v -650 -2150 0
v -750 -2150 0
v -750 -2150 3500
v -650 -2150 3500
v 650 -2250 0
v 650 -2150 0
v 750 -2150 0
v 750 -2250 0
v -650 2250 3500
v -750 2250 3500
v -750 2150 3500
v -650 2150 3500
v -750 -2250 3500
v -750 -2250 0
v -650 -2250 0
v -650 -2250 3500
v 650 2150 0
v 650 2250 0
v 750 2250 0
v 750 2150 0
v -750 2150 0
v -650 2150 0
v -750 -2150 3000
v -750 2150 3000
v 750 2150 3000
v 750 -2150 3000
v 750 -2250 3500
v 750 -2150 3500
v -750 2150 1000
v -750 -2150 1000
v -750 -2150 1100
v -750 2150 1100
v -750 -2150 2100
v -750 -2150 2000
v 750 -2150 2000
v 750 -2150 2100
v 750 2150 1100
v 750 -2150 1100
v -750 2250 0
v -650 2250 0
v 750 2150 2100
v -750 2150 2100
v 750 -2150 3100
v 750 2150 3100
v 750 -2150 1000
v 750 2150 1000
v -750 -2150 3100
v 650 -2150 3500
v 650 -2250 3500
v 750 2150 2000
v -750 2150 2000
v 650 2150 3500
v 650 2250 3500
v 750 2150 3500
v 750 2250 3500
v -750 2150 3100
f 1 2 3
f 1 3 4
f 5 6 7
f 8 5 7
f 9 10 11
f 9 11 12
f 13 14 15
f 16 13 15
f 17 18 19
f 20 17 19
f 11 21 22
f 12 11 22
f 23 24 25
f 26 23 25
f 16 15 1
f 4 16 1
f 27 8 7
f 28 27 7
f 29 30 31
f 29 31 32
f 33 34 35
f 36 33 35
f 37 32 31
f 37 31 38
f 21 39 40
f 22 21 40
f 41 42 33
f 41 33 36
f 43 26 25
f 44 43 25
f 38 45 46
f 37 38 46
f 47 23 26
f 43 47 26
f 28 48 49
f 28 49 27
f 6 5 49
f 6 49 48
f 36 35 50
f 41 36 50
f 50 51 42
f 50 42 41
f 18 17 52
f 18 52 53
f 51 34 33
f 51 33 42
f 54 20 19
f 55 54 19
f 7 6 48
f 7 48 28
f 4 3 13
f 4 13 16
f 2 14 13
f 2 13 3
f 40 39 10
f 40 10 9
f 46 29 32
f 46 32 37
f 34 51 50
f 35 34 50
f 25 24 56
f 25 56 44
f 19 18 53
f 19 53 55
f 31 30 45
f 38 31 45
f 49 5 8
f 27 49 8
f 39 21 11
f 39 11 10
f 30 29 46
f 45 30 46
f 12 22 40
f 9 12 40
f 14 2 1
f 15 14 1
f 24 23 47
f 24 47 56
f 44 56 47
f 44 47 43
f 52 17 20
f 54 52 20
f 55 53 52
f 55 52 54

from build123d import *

# Parameters (mm, degrees)
F3_W     = 100
F3_H     = 100
F7_DEPTH = 3500
F4_W     = 1500
F4_H     = 4300
F5_W     = 1500
F5_H     = 4300
F8_DEPTH = 100
F6_W     = 1500
F6_H     = 4300
F9_DEPTH = 100


with BuildPart() as f7:
    # F3 (on Top) → F7 (new body)
    with BuildSketch(Plane.XY):
        with Locations((-700, 2200)):
            Rectangle(F3_W, F3_H)
        with Locations((700, 2200)):
            Rectangle(F3_W, F3_H)
        with Locations((-700, -2200)):
            Rectangle(F3_W, F3_H)
        with Locations((700, -2200)):
            Rectangle(F3_W, F3_H)
    extrude(amount=F7_DEPTH)


with BuildPart() as f8:
    # F4 (on offset) + F5 (on offset) → F8 (new body)
    with BuildSketch(Plane.XY.offset(1000)):
        Rectangle(F4_W, F4_H)
    with BuildSketch(Plane.XY.offset(2000)):
        Rectangle(F5_W, F5_H)
    extrude(amount=F8_DEPTH)


with BuildPart() as f9:
    # F6 (on offset) → F9 (new body)
    with BuildSketch(Plane.XY.offset(3000)):
        Rectangle(F6_W, F6_H)
    extrude(amount=F9_DEPTH)


solid = Compound([f7.part, f8.part, f9.part])
